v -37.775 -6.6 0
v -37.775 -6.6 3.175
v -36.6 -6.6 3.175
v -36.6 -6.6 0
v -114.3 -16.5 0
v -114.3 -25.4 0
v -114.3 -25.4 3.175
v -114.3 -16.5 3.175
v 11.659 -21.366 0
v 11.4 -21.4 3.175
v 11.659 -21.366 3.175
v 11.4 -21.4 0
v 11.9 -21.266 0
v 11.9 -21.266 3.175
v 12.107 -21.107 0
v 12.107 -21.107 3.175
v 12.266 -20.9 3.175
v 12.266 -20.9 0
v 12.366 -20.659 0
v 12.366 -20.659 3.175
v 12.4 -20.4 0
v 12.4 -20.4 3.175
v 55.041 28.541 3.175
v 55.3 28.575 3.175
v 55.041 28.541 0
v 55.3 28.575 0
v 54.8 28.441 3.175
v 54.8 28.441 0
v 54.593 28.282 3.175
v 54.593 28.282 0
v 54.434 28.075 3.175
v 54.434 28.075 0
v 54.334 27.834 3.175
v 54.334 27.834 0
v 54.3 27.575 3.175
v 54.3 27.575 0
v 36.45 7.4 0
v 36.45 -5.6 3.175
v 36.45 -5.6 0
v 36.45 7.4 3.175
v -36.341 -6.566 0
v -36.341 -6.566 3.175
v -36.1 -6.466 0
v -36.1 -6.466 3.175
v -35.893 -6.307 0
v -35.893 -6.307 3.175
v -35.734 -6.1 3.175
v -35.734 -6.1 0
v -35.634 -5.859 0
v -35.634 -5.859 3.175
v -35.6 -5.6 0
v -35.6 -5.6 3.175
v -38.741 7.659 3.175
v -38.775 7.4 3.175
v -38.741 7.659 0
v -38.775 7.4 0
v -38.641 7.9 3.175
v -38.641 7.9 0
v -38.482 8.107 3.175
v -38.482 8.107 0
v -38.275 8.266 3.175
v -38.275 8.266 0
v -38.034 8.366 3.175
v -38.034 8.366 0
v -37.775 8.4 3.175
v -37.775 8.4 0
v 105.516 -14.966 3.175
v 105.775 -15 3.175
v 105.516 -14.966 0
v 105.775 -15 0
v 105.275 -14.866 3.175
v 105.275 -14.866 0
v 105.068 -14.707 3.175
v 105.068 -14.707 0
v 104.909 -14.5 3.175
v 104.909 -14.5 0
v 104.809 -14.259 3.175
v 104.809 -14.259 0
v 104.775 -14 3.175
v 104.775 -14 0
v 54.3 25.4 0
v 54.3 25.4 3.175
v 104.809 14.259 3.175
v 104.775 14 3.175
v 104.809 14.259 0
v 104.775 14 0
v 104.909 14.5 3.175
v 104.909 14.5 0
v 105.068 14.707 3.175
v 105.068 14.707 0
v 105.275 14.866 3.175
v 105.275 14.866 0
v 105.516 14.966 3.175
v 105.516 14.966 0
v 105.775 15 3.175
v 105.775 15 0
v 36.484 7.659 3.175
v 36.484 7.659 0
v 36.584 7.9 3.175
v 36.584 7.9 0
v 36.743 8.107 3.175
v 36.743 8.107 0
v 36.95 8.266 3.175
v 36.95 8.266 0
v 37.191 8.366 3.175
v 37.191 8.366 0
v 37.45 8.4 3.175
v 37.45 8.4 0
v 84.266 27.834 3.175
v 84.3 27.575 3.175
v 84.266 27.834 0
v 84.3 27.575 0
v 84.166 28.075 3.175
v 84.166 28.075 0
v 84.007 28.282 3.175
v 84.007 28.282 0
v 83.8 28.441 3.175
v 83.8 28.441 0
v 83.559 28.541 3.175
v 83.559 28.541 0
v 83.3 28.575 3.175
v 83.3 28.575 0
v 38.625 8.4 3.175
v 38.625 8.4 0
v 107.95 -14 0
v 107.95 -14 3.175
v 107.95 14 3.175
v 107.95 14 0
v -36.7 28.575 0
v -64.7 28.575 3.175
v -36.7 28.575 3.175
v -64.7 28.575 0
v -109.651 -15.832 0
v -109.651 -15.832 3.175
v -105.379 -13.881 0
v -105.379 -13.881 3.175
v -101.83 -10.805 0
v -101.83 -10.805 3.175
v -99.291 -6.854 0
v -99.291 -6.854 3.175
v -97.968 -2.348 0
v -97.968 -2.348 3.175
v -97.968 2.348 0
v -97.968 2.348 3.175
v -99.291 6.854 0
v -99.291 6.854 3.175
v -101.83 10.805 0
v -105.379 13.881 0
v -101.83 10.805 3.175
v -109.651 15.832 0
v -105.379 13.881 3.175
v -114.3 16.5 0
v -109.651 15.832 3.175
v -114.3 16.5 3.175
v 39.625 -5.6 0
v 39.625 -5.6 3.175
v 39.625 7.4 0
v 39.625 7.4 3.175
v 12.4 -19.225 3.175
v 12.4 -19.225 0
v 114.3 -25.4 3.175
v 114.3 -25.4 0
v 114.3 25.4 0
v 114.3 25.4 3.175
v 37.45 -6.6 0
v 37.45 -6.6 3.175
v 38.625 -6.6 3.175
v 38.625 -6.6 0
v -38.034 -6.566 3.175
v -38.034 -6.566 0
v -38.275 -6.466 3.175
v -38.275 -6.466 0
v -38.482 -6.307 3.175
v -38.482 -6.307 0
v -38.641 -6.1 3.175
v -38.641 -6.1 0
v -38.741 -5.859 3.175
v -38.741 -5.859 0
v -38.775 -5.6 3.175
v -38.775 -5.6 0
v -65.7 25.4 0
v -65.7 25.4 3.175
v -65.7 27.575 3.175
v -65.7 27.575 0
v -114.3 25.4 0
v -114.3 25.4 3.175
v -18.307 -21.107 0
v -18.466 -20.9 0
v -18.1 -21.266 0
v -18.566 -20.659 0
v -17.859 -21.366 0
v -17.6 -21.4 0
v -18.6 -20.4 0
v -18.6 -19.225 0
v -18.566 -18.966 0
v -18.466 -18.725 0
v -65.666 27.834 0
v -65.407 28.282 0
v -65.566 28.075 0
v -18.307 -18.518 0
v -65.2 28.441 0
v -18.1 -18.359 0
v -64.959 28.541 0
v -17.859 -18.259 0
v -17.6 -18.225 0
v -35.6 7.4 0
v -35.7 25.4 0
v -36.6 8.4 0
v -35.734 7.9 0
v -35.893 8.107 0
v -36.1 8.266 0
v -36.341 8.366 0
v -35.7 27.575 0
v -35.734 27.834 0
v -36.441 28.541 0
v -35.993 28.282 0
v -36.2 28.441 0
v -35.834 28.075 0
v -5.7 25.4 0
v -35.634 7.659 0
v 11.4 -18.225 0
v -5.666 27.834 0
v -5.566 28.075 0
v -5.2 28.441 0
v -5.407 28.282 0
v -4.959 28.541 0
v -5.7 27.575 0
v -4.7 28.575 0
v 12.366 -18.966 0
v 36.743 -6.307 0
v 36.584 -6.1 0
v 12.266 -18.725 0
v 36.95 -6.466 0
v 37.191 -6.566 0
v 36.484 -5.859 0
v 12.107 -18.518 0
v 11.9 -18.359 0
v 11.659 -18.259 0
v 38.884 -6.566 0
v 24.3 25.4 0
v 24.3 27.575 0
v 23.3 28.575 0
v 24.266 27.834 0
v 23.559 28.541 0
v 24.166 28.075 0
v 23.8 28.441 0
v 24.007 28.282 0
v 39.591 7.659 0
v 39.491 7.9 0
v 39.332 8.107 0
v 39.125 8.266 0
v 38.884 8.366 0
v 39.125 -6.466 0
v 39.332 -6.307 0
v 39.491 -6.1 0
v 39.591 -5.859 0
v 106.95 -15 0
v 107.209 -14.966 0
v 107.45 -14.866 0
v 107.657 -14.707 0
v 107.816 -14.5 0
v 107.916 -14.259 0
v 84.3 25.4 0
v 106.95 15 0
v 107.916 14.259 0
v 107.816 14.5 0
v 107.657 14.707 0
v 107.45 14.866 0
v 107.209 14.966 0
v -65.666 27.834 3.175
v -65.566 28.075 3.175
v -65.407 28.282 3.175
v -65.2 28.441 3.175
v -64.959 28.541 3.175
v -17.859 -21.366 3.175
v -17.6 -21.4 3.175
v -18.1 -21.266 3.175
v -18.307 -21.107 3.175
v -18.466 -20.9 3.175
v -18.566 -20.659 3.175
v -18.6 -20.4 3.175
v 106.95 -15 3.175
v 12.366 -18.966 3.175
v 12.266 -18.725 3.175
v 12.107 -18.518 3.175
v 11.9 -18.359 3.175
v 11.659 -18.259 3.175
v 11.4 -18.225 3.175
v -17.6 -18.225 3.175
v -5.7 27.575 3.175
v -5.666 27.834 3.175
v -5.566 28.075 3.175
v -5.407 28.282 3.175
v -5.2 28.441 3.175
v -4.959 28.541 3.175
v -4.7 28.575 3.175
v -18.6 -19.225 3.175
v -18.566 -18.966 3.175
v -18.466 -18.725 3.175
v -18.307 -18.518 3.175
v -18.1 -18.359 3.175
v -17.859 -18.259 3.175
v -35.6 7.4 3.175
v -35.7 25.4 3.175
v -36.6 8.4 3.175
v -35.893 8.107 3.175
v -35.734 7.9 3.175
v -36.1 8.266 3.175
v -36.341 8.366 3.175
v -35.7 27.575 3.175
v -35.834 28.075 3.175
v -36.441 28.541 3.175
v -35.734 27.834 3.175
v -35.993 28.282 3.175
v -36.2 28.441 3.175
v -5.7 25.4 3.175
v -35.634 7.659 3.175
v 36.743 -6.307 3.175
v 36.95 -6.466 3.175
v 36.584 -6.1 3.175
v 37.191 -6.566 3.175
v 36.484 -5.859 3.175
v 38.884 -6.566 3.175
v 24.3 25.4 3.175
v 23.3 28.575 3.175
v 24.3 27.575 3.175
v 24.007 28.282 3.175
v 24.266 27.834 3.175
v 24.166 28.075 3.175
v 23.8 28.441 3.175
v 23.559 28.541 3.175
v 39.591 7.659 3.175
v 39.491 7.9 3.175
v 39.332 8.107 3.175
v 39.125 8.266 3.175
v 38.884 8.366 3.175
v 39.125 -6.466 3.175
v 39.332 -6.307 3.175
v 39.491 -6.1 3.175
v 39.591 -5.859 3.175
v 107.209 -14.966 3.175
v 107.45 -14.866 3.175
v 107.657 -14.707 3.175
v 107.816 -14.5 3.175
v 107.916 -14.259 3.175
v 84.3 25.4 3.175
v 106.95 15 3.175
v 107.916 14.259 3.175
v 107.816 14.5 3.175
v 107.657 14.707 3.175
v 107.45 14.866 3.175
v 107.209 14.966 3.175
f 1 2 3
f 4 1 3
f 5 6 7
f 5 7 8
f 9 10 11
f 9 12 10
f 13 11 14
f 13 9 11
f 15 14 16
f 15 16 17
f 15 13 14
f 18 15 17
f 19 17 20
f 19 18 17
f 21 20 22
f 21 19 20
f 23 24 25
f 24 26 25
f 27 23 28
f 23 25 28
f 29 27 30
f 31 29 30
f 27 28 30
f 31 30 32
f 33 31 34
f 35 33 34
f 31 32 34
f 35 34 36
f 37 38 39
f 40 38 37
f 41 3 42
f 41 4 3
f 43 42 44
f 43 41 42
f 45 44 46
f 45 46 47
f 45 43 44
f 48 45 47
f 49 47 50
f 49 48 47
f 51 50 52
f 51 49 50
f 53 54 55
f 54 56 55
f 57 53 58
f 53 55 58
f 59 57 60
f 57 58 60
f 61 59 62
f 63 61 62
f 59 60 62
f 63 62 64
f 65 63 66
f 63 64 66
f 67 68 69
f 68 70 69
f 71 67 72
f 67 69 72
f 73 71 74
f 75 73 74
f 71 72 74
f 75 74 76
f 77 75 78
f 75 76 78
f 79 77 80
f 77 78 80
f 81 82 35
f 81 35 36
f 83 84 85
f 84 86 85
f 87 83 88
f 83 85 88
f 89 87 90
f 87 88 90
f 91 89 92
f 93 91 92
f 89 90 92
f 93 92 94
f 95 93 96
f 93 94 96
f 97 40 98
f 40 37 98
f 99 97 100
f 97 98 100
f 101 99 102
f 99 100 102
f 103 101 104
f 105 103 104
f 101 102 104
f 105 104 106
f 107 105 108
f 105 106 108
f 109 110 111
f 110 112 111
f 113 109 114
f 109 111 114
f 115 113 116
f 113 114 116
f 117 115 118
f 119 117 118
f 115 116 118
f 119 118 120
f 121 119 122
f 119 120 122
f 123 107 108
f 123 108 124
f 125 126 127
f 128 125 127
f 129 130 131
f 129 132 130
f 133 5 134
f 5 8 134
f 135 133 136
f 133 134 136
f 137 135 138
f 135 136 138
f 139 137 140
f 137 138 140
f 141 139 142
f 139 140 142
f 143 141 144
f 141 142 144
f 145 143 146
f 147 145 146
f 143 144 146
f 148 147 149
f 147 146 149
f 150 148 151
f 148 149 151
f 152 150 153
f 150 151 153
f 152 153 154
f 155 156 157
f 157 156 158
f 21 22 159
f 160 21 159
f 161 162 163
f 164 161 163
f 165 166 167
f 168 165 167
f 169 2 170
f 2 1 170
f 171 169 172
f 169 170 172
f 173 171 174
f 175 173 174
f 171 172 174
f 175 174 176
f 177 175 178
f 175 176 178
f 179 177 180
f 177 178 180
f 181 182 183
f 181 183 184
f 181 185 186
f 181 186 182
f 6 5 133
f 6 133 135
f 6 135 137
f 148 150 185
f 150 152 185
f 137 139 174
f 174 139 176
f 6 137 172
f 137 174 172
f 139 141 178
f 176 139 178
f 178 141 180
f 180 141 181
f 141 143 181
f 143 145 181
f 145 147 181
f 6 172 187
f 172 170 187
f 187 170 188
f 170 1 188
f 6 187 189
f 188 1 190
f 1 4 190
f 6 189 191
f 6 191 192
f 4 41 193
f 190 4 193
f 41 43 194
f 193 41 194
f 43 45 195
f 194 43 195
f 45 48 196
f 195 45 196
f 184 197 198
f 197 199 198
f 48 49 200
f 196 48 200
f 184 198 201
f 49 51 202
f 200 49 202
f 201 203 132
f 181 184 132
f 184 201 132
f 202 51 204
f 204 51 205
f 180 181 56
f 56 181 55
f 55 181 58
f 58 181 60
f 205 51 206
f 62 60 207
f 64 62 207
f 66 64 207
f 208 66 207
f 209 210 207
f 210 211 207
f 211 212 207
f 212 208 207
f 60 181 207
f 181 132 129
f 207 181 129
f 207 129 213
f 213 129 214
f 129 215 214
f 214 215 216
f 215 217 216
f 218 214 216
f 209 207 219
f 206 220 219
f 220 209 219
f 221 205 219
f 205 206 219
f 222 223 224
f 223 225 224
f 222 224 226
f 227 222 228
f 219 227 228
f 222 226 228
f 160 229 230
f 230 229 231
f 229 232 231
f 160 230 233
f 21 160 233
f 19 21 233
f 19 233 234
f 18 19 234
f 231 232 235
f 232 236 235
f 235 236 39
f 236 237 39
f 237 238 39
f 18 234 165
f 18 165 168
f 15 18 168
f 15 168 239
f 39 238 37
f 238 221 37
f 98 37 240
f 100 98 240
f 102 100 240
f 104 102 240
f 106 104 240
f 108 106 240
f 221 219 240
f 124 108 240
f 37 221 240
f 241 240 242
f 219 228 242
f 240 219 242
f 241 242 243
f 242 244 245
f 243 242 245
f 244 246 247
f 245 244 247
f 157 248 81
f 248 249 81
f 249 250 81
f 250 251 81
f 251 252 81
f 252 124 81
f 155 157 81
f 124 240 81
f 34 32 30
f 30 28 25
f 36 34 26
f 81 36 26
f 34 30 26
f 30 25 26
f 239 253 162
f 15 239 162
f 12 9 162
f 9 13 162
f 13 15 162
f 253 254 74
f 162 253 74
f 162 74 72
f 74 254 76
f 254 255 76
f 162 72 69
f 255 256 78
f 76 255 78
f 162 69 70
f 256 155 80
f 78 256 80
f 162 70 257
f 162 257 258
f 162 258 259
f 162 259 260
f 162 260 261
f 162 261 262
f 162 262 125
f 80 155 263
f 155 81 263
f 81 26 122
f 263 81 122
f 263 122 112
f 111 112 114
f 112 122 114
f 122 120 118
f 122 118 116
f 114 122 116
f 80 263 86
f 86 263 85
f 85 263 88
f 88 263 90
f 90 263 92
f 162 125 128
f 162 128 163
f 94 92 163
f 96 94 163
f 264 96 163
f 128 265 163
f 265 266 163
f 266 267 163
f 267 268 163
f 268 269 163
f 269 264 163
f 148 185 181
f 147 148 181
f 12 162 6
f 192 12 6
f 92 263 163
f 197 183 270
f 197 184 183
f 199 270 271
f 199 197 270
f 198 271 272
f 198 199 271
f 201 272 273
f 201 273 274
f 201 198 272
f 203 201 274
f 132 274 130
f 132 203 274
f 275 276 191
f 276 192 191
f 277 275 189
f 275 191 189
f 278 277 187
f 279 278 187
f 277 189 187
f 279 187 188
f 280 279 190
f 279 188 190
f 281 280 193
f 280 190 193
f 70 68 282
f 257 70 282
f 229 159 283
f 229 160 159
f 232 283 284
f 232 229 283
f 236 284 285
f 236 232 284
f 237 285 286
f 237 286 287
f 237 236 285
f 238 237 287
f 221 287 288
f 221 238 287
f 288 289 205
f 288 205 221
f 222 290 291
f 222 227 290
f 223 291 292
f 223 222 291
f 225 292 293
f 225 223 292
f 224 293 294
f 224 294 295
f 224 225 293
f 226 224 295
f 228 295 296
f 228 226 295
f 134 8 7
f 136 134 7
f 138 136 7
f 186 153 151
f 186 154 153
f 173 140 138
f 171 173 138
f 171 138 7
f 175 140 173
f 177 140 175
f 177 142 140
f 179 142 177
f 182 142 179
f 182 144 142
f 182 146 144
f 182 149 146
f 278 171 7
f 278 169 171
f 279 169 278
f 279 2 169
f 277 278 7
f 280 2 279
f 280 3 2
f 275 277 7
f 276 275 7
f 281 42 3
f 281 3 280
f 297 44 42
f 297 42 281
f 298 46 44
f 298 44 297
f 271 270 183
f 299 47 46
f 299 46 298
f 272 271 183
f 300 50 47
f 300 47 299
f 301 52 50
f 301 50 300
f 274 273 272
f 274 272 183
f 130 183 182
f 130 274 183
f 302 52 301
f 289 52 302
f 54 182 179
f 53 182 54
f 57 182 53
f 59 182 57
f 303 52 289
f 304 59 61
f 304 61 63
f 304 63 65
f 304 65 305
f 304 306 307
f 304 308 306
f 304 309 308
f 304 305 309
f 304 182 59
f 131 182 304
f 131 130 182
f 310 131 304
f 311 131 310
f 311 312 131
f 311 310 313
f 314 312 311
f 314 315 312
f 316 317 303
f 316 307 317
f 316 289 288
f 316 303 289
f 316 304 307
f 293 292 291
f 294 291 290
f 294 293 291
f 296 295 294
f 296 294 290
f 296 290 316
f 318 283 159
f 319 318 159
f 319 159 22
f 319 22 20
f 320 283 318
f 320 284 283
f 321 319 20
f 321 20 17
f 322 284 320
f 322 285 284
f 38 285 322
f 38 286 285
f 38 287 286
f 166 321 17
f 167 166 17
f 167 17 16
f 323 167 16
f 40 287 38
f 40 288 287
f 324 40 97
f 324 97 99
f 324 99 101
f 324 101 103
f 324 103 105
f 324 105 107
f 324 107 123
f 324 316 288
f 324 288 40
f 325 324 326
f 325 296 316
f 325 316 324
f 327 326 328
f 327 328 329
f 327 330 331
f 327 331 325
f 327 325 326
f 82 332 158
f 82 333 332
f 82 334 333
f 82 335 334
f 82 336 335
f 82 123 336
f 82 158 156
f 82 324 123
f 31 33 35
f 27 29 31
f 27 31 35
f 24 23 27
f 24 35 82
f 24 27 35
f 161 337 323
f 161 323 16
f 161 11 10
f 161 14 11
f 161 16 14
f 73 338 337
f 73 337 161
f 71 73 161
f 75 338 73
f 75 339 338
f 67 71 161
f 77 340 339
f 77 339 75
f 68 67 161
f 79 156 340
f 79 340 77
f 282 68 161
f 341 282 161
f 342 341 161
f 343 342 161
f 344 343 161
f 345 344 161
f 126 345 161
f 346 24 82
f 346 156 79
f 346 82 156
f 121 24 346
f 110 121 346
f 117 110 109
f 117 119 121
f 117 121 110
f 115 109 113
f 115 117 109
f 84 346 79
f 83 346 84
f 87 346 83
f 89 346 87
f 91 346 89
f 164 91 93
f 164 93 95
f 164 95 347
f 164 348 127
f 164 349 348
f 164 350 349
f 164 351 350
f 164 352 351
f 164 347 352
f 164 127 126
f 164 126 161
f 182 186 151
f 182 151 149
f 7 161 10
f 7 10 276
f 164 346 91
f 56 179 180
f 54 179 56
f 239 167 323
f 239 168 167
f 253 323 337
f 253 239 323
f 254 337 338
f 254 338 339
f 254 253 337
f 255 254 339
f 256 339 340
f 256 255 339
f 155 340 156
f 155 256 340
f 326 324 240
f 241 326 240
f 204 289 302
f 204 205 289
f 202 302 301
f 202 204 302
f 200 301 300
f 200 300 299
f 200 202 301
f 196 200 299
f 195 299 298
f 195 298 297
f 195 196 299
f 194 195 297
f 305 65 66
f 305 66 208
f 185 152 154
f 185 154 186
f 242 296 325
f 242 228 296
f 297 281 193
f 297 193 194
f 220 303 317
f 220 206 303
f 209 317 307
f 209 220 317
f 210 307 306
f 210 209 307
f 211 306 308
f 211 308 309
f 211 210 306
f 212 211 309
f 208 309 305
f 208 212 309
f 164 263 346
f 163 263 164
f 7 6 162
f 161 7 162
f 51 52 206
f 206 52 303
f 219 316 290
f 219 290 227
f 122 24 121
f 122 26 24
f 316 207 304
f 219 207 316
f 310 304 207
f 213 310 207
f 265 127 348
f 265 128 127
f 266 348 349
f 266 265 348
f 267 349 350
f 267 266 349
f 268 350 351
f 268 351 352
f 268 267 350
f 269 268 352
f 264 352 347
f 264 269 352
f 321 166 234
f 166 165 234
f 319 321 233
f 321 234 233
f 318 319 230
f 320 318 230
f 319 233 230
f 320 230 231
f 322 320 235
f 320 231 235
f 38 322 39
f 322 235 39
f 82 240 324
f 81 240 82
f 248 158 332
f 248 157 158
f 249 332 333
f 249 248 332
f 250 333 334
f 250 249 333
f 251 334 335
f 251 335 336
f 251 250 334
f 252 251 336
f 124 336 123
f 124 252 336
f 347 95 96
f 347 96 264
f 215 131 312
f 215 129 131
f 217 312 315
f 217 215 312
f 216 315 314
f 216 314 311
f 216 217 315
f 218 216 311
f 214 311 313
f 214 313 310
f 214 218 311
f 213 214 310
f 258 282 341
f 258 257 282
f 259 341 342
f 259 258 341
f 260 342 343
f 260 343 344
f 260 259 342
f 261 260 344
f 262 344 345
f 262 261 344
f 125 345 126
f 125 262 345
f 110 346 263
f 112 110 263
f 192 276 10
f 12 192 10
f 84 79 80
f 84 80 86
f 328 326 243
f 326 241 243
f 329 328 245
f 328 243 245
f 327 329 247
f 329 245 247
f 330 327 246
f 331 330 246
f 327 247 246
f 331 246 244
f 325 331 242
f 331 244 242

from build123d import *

# Parameters (mm, degrees)
SKETCH1_W           = 228.6
SKETCH1_H           = 50.8
BOSS_EXTRUDE1_DEPTH = 3.175
SKETCH2_W           = 30
SKETCH2_H           = 3.175
BOSS_EXTRUDE2_DEPTH = 3.175
SKETCH3_R           = 16.5
CUT_EXTRUDE1_DEPTH  = 4.175
SKETCH4_W           = 3.175
SKETCH4_H           = 30
SKETCH4_H_2         = 15
CUT_EXTRUDE2_DEPTH  = 10
SKETCH5_W           = 31
SKETCH5_H           = 3.175
CUT_EXTRUDE3_DEPTH  = 10
FILLET1_R           = 1


with BuildPart() as part:
    # Sketch1 → Boss-Extrude1 (new body)
    with BuildSketch(Plane.XY):
        Rectangle(SKETCH1_W, SKETCH1_H)
    extrude(amount=BOSS_EXTRUDE1_DEPTH)

    # Sketch2 → Boss-Extrude2 (add)
    with BuildSketch(Plane(origin=(0, 25.4, 0), x_dir=(1, 0, 0), z_dir=(0, 1, 0))):
        with Locations((69.3, -1.5875)):
            Rectangle(SKETCH2_W, SKETCH2_H)
        with Locations((9.3, -1.5875)):
            Rectangle(SKETCH2_W, SKETCH2_H)
        with Locations((-50.7, -1.5875)):
            Rectangle(SKETCH2_W, SKETCH2_H)
    extrude(amount=BOSS_EXTRUDE2_DEPTH)

    # Sketch3 → Cut-Extrude1 (cut, through all)
    with BuildSketch(Plane.XY.offset(3.175)):
        with Locations((-114.3, 0)):
            Circle(SKETCH3_R)
    extrude(amount=-CUT_EXTRUDE1_DEPTH, mode=Mode.SUBTRACT)

    # Sketch4 → Cut-Extrude2 (cut)
    with BuildSketch(Plane.XY.offset(3.175)):
        with Locations((106.3625, 0)):
            Rectangle(SKETCH4_W, SKETCH4_H)
        with Locations((38.0375, 0.9)):
            Rectangle(SKETCH4_W, SKETCH4_H_2)
        with Locations((-37.1875, 0.9)):
            Rectangle(SKETCH4_W, SKETCH4_H_2)
    extrude(amount=-CUT_EXTRUDE2_DEPTH, mode=Mode.SUBTRACT)

    # Sketch5 → Cut-Extrude3 (cut)
    with BuildSketch(Plane.XY.offset(3.175)):
        with Locations((-3.1, -19.8125)):
            Rectangle(SKETCH5_W, SKETCH5_H)
    extrude(amount=-CUT_EXTRUDE3_DEPTH, mode=Mode.SUBTRACT)

    # Fillet1
    fillet1_edges = [part.edges().sort_by_distance(p)[0] for p in [
        (-38.775, -6.6, 1.5875),
        (-38.775, 8.4, 1.5875),
        (-35.6, 8.4, 1.5875),
        (-35.6, -6.6, 1.5875),
        (104.775, -15, 1.5875),
        (104.775, 15, 1.5875),
        (107.95, 15, 1.5875),
        (107.95, -15, 1.5875),
        (39.625, 8.4, 1.5875),
        (39.625, -6.6, 1.5875),
        (36.45, -6.6, 1.5875),
        (36.45, 8.4, 1.5875),
        (12.4, -18.225, 1.5875),
        (12.4, -21.4, 1.5875),
        (-18.6, -21.4, 1.5875),
        (-18.6, -18.225, 1.5875),
        (84.3, 28.575, 1.5875),
        (54.3, 28.575, 1.5875),
        (-5.7, 28.575, 1.5875),
        (24.3, 28.575, 1.5875),
        (-65.7, 28.575, 1.5875),
        (-35.7, 28.575, 1.5875),
    ]]
    fillet(fillet1_edges, radius=FILLET1_R)


solid = part.part
